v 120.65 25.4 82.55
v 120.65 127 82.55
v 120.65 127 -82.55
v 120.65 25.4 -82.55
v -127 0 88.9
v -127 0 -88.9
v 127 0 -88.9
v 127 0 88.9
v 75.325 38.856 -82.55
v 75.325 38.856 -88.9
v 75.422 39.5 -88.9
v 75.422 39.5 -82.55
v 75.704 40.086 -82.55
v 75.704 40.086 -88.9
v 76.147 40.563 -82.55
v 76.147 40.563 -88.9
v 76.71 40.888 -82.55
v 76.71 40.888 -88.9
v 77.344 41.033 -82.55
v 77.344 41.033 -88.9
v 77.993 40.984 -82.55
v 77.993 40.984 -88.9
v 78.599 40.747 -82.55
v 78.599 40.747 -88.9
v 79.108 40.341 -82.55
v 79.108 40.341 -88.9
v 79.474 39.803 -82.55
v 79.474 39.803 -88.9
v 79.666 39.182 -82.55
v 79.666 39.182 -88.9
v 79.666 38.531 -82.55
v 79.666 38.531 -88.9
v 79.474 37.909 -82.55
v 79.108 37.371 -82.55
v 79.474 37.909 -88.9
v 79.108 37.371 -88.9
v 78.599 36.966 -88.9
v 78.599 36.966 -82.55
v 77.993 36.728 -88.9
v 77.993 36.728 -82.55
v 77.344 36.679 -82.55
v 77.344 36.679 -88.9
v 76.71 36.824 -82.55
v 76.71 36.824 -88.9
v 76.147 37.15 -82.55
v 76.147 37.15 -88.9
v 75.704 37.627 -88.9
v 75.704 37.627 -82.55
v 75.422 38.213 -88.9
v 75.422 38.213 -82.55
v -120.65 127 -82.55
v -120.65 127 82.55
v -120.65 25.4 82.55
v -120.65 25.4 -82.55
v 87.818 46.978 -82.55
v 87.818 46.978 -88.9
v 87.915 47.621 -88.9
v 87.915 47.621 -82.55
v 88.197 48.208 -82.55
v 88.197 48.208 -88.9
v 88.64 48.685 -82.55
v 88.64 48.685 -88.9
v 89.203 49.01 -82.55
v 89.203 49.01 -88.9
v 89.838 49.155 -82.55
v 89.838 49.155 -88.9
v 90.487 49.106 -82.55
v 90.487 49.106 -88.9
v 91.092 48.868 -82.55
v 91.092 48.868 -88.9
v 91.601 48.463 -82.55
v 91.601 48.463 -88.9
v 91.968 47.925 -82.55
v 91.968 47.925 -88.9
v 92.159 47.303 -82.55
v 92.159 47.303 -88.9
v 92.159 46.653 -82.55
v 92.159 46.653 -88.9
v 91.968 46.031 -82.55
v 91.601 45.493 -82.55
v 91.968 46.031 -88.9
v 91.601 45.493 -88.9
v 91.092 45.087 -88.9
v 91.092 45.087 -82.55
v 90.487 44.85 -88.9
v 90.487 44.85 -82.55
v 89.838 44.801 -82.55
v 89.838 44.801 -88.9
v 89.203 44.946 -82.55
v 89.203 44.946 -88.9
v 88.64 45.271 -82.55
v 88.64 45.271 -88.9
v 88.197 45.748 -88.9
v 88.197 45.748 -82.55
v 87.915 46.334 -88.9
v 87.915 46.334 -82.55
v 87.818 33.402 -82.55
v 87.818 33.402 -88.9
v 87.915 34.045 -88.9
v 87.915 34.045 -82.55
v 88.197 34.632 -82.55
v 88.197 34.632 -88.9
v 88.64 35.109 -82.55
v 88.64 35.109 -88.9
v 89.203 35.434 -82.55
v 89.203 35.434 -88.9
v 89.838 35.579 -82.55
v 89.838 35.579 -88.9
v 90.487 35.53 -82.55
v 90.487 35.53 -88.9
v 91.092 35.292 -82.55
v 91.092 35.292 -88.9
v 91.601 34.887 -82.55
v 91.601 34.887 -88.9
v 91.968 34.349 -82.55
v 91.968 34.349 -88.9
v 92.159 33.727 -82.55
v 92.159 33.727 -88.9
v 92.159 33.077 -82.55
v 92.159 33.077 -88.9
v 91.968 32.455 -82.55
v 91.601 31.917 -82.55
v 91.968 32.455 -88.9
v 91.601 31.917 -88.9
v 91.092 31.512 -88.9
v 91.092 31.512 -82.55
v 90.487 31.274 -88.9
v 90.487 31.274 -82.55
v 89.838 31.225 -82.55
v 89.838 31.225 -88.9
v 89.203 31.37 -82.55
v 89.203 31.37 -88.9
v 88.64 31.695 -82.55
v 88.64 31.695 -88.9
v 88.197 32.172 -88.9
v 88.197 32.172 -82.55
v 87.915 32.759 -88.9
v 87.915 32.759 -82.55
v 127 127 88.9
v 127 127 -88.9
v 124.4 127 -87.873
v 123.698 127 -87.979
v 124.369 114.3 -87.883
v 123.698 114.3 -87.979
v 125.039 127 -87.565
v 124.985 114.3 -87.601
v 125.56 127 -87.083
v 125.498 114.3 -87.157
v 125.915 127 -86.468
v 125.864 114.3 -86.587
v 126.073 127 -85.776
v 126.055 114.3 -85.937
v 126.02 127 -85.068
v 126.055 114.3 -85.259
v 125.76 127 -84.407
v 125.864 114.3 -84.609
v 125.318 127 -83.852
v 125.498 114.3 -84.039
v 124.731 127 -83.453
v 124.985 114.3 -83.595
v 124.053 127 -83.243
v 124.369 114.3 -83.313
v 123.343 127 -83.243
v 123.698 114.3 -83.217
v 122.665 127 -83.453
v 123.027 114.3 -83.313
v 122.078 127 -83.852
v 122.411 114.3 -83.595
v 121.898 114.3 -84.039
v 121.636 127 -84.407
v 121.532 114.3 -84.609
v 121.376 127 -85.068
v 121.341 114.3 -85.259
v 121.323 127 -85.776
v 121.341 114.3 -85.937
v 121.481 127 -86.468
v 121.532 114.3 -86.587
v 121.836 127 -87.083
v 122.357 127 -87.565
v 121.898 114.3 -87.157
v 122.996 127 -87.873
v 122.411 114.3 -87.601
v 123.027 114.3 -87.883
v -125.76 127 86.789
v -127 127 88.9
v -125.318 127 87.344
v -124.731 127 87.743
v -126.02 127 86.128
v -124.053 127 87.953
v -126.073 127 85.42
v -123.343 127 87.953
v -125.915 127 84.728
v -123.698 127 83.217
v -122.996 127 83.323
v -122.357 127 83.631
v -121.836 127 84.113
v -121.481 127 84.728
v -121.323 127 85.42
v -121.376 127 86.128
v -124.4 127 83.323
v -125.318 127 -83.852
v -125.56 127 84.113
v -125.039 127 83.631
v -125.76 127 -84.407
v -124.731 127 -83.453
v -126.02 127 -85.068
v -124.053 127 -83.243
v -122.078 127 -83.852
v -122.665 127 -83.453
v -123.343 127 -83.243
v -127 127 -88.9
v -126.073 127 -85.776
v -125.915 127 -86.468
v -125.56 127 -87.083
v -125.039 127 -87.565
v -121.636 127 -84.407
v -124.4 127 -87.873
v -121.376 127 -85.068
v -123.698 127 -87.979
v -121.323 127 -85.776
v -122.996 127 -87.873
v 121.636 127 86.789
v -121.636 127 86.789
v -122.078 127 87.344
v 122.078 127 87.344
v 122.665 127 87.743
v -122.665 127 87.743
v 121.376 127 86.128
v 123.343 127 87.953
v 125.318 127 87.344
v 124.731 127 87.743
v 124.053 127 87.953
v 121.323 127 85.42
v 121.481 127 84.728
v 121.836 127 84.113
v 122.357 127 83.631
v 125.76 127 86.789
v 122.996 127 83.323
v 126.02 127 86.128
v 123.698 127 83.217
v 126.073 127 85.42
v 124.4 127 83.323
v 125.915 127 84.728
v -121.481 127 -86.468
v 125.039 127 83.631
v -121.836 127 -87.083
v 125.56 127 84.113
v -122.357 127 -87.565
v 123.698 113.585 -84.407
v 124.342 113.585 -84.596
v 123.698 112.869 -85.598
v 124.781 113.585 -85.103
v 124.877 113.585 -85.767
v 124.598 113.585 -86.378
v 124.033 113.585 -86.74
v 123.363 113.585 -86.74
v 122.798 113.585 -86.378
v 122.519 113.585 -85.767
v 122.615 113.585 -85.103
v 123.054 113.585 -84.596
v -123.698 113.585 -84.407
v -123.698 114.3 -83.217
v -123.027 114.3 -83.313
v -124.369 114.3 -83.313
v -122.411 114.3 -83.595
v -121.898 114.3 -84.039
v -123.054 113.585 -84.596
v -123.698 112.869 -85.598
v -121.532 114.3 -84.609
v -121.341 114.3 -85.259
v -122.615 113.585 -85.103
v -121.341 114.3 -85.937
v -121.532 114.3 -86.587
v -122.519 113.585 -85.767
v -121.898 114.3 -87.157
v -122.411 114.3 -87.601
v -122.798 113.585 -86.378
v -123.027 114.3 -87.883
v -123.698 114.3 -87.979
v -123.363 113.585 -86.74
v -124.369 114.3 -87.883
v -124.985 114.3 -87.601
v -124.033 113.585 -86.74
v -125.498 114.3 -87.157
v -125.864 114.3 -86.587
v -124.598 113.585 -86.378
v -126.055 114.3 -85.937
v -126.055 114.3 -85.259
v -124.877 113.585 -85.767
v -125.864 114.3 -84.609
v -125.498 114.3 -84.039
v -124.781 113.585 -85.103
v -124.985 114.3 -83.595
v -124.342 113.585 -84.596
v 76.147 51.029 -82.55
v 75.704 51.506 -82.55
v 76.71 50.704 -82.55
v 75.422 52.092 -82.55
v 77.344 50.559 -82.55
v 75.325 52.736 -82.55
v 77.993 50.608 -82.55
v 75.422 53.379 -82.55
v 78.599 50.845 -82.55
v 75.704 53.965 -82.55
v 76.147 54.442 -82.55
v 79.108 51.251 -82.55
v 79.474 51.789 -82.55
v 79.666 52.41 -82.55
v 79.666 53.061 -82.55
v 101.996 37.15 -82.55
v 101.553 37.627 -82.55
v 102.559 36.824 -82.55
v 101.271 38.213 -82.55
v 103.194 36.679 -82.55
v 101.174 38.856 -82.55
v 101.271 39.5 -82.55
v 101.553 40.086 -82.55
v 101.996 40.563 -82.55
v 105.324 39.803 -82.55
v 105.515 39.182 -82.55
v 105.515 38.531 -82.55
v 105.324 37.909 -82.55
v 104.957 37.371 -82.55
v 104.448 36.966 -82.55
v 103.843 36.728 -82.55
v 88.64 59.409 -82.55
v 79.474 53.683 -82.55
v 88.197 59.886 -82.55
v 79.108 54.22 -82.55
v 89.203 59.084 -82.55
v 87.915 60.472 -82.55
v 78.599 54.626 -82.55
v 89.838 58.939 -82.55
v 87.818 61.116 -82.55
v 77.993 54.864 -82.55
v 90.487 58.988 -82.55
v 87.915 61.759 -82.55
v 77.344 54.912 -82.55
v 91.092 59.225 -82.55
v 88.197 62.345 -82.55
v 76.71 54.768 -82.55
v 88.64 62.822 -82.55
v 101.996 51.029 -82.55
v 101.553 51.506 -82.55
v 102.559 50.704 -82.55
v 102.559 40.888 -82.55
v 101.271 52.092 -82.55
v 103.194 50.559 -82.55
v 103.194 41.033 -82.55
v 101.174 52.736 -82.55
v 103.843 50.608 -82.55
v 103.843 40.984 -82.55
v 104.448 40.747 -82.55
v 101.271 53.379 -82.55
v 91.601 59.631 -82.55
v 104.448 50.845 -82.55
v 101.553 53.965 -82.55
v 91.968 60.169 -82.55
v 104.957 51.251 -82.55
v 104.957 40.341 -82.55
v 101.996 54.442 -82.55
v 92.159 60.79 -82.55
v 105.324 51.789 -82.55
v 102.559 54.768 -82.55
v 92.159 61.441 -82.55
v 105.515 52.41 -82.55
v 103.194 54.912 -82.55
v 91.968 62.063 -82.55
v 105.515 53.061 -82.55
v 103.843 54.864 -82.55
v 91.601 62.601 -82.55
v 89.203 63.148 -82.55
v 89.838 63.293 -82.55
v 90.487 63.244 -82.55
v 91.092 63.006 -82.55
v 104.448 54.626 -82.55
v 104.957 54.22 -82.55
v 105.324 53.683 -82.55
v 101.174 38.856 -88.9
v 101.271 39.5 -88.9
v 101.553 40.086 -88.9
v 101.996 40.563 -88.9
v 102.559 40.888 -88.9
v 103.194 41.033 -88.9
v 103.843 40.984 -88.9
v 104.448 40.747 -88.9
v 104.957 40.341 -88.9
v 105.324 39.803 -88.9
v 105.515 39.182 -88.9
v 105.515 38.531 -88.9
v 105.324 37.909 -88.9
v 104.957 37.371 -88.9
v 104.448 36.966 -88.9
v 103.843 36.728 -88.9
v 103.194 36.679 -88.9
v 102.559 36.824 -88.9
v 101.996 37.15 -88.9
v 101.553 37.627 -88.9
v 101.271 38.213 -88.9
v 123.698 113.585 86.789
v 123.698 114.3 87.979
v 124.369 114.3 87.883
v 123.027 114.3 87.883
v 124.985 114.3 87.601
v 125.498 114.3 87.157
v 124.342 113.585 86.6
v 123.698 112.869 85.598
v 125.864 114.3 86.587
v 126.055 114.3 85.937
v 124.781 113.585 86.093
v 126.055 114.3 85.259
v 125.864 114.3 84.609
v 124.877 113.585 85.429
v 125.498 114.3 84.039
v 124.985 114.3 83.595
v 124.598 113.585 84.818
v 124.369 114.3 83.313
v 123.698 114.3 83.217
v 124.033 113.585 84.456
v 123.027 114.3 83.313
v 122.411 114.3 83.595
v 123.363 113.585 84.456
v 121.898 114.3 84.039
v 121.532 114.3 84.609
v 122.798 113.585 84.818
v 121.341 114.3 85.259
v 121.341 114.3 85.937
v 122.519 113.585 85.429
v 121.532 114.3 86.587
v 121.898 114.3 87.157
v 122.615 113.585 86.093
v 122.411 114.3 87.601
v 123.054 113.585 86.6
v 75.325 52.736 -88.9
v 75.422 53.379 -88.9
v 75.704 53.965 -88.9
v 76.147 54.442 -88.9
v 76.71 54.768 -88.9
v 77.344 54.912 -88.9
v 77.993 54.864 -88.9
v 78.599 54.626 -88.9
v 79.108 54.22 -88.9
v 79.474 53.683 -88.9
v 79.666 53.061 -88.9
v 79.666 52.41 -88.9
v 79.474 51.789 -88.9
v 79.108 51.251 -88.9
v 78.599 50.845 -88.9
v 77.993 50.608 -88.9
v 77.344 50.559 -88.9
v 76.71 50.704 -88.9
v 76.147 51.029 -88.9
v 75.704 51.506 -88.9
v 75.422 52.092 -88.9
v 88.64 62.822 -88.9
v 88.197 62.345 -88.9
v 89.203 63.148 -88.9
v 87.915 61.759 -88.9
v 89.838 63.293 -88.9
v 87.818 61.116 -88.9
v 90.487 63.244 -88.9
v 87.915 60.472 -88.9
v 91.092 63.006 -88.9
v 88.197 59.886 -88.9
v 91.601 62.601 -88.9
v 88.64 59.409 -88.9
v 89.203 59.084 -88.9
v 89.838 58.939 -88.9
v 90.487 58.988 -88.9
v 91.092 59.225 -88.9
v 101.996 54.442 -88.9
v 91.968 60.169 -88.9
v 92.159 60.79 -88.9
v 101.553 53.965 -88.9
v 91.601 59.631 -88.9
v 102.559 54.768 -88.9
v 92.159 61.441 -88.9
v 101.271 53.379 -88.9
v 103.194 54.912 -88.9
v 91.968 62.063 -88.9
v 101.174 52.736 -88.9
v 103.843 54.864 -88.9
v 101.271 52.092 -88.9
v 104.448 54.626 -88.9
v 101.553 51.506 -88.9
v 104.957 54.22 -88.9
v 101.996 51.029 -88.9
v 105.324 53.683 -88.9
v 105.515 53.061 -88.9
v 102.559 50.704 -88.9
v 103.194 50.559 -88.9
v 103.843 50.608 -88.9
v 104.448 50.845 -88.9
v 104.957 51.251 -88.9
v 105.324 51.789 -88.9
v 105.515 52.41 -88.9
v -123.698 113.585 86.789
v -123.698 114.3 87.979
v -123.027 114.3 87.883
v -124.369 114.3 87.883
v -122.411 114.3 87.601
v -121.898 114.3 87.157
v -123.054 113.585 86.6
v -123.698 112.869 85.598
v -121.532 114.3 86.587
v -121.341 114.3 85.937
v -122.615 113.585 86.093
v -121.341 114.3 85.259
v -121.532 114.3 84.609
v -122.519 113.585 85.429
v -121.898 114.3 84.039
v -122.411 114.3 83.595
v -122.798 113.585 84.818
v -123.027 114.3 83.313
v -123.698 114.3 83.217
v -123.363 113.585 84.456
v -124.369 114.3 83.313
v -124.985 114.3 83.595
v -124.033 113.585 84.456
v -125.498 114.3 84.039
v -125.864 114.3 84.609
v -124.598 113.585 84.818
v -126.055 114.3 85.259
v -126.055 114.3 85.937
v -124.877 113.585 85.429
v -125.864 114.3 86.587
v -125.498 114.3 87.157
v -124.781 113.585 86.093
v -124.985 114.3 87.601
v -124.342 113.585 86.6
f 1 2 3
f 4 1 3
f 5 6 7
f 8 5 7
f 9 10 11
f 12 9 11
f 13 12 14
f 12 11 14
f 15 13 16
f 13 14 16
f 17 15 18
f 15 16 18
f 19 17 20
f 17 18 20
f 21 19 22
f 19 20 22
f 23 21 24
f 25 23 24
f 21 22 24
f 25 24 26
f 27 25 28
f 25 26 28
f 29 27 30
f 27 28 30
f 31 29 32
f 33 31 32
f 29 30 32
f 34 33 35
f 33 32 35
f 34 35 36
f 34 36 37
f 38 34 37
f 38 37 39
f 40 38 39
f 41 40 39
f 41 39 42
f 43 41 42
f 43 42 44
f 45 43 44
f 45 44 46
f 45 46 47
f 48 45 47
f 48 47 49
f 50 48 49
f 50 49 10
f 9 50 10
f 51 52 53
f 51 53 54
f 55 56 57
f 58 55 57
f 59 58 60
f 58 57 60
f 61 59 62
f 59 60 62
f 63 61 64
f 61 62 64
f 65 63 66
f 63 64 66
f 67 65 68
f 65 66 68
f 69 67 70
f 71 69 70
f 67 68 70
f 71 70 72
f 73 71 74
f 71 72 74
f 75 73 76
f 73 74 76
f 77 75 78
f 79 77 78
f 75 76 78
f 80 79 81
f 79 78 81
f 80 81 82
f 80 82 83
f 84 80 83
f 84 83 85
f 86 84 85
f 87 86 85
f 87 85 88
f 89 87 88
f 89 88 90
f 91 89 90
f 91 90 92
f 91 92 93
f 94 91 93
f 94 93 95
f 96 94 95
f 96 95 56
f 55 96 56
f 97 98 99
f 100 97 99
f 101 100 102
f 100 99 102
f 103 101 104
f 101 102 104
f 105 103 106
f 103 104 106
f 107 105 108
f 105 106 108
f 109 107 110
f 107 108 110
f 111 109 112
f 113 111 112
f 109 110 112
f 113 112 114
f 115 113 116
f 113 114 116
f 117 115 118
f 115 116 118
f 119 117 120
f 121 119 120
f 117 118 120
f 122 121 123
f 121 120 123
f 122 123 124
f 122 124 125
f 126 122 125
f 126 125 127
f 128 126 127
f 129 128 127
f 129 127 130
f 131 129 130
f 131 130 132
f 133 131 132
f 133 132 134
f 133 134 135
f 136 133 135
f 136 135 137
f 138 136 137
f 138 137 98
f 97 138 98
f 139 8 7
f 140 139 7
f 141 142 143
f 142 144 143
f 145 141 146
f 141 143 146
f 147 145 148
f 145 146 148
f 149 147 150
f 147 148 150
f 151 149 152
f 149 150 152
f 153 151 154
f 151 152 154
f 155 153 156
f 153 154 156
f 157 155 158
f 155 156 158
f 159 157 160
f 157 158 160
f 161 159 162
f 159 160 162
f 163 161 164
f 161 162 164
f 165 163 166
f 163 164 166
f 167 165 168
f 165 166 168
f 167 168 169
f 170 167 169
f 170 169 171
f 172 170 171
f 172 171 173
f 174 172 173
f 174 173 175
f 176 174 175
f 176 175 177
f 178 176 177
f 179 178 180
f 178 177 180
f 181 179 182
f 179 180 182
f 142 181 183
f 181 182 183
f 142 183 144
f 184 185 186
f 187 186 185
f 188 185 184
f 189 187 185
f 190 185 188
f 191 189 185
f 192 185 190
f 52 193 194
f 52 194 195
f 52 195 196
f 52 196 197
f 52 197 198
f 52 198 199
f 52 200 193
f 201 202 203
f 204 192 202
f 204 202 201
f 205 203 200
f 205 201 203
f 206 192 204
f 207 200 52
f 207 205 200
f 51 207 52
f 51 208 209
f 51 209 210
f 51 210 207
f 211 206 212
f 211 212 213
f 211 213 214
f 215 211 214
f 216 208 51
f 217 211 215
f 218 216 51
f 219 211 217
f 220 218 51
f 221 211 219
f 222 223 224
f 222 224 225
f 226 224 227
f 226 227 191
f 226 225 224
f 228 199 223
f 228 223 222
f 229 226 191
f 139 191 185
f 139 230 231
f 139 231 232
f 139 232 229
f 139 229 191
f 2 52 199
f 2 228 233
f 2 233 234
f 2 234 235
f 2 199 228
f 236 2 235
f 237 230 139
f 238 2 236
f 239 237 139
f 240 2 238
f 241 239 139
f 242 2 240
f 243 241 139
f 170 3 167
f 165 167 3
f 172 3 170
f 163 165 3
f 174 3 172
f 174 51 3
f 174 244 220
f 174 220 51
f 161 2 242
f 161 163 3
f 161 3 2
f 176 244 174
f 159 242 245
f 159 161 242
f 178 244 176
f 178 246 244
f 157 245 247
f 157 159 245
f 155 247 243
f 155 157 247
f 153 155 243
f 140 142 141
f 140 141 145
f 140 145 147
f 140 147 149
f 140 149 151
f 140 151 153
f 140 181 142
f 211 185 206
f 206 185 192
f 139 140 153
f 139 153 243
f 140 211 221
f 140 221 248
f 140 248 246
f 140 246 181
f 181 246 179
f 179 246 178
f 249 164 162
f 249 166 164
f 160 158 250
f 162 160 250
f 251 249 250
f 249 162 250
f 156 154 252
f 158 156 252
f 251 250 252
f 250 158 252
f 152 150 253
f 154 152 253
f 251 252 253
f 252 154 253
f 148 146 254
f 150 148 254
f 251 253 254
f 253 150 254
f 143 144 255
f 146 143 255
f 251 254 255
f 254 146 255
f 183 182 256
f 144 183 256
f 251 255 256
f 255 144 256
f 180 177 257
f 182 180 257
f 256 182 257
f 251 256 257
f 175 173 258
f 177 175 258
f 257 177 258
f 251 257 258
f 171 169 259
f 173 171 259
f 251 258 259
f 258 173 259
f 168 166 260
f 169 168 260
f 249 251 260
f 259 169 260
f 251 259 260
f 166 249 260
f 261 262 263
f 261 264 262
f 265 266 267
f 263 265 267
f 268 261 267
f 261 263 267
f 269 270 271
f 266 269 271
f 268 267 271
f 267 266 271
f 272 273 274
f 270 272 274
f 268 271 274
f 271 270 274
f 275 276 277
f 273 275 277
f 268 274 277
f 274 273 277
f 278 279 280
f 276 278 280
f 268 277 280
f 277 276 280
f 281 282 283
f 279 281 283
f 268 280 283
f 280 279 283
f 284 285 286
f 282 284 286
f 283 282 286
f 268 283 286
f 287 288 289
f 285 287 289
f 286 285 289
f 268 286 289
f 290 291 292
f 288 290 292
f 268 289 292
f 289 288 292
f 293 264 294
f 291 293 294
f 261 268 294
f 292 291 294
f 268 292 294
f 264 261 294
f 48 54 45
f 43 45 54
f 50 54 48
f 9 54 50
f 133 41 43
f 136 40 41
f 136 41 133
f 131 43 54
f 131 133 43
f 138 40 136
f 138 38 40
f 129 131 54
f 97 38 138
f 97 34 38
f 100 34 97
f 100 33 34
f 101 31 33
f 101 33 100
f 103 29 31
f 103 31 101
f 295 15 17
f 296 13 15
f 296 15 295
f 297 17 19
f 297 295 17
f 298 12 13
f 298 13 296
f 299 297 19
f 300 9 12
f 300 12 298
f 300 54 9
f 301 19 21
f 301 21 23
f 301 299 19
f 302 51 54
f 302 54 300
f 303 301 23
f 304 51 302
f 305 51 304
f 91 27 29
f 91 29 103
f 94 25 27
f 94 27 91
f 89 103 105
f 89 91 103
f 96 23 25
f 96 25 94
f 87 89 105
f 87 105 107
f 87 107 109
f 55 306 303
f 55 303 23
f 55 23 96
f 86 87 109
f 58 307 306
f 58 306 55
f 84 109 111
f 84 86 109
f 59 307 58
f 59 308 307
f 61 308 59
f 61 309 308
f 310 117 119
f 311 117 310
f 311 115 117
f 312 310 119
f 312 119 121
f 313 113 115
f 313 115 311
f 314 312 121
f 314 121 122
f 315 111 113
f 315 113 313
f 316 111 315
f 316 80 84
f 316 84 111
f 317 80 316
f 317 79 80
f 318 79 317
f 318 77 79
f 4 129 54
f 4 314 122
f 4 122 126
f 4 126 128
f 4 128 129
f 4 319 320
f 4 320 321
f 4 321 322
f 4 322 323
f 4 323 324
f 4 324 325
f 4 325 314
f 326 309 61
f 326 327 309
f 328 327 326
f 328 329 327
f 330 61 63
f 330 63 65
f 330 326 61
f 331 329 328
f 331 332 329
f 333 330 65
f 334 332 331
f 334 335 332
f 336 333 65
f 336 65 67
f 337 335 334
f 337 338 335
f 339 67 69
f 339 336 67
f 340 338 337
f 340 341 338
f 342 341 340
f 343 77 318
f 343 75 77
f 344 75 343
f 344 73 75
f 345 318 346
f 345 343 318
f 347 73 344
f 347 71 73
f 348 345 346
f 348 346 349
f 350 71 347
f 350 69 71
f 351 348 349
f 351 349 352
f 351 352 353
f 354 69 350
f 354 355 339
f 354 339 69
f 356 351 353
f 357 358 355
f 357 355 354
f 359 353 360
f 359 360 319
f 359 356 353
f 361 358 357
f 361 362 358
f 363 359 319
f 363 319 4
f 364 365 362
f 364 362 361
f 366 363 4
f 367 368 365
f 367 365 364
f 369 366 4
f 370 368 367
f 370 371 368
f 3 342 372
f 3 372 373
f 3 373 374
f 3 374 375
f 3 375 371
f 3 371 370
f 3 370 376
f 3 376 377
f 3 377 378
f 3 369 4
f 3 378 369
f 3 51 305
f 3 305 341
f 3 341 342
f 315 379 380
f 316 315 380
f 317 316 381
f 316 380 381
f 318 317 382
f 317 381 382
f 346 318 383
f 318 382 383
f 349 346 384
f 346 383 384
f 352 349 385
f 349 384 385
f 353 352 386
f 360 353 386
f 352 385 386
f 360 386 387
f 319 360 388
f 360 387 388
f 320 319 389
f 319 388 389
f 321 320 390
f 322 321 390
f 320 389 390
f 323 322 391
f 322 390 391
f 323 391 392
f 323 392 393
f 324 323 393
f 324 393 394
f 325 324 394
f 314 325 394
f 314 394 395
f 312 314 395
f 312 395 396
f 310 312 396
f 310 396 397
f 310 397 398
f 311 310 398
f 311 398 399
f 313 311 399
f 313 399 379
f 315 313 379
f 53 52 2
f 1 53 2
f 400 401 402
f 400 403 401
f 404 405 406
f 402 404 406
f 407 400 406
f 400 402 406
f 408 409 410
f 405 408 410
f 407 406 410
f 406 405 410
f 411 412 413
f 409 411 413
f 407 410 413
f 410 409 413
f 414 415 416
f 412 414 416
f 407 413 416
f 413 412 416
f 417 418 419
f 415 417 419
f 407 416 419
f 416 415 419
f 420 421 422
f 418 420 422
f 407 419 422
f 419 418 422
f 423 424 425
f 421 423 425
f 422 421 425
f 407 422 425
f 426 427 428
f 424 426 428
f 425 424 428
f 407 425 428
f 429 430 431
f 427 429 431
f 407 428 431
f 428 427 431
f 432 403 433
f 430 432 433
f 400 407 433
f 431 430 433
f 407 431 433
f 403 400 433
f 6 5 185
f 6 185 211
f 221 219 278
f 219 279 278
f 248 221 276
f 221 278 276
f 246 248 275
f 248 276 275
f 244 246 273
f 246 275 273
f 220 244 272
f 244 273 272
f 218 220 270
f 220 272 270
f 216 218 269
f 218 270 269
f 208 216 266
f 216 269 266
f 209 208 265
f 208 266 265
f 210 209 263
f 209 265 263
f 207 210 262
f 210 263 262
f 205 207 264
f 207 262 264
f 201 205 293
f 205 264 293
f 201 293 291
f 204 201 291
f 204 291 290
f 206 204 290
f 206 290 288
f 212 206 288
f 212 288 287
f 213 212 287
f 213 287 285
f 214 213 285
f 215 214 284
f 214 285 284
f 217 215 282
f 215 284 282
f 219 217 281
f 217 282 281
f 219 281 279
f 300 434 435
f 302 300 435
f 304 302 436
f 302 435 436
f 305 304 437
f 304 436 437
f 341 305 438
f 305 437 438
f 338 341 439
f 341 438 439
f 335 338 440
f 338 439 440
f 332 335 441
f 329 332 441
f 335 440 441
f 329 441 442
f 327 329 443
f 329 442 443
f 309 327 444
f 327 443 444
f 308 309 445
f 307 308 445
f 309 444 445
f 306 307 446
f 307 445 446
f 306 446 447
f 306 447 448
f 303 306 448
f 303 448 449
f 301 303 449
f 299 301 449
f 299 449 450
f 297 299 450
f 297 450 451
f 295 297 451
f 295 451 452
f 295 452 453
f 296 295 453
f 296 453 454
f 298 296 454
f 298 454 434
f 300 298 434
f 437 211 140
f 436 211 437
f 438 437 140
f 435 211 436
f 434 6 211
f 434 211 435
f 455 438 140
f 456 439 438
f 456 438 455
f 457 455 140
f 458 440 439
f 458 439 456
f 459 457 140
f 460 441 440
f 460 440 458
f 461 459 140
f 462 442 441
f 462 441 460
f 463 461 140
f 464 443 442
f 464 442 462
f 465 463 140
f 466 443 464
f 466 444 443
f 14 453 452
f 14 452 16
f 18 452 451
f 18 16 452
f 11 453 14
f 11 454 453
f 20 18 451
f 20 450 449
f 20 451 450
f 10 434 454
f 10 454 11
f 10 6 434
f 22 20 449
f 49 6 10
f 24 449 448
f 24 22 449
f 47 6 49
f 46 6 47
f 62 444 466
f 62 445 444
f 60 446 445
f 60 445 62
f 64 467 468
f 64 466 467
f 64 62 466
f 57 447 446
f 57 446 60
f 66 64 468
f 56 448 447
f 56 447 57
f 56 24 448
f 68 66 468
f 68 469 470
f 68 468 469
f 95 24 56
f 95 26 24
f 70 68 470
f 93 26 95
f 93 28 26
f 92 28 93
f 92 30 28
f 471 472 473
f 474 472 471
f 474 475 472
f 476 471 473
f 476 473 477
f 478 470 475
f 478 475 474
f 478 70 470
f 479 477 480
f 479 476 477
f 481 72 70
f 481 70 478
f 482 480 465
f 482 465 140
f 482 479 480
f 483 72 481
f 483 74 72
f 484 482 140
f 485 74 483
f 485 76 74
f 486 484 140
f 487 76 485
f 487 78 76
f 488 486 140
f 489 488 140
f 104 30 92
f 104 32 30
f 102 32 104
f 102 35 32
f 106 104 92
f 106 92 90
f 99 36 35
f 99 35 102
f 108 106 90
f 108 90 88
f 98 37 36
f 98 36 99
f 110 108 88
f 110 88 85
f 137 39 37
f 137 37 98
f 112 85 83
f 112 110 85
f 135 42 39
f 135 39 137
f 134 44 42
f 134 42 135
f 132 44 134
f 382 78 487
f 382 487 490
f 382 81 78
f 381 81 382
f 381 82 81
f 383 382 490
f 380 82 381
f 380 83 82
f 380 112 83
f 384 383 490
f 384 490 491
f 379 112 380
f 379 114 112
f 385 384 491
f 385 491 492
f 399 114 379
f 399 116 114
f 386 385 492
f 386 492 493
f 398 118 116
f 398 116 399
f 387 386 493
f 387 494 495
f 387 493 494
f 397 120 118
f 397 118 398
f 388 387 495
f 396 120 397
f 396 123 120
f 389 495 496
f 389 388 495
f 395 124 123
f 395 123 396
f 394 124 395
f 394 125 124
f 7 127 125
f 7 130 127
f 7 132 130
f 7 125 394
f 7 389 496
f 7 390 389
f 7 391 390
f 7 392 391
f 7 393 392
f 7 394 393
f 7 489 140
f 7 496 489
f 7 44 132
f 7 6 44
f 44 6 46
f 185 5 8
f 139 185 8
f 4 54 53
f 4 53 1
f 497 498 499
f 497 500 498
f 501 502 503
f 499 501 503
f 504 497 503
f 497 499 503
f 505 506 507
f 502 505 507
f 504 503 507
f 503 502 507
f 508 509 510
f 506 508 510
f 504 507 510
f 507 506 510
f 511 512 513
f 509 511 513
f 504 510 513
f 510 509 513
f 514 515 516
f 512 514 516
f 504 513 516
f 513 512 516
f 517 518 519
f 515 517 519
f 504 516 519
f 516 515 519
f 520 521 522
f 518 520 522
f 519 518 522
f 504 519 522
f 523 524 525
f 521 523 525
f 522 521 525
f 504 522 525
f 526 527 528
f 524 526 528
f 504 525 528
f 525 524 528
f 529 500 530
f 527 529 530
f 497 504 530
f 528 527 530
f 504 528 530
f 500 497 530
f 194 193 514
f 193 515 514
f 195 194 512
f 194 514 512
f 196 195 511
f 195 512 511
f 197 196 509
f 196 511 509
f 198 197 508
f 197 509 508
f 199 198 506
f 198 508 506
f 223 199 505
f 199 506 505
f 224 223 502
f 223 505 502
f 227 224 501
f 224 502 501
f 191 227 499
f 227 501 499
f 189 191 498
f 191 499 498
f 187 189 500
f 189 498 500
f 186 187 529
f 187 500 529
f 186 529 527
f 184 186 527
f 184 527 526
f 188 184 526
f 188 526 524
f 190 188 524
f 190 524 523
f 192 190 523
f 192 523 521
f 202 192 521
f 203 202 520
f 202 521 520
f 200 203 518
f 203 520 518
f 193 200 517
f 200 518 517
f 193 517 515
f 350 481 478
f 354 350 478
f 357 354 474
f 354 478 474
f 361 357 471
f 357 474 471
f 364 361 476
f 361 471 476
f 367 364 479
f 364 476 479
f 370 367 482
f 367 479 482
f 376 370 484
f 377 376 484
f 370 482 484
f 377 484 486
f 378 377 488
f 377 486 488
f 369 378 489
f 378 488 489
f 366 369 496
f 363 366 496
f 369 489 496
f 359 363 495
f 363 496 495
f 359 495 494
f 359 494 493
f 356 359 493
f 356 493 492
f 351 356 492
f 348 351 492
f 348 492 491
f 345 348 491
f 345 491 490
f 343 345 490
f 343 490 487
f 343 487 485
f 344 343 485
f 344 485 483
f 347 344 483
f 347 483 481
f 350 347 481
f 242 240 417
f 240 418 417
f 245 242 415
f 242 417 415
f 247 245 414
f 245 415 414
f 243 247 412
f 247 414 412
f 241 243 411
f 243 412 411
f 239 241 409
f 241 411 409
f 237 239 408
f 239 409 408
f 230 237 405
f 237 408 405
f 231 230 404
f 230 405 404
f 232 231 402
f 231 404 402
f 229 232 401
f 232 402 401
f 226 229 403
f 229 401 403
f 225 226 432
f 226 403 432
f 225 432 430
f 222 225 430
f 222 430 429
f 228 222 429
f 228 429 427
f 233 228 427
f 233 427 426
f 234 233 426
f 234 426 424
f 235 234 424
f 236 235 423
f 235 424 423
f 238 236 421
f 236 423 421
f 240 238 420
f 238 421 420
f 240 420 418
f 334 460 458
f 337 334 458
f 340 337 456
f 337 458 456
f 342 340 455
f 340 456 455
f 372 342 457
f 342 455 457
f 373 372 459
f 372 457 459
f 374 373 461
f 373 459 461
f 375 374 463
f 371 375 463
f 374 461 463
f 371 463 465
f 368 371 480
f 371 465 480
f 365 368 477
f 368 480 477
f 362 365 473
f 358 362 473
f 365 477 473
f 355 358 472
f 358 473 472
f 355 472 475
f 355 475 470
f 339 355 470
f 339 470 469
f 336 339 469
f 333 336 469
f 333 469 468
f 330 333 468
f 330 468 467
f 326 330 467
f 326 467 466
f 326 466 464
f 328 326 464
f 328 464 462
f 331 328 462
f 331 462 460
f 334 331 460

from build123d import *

# Parameters (mm, degrees)
SKETCH1_W                            = 254
SKETCH1_H                            = 177.8
BOSS_EXTRUDE1_DEPTH                  = 127
SKETCH2_W                            = 241.3
SKETCH2_H                            = 165.1
CUT_EXTRUDE1_DEPTH                   = 101.6
F_3_16_0_1875_DIAMETER_HOLE3_D       = 4.7625
F_3_16_0_1875_DIAMETER_HOLE3_DEPTH   = 12.7
F_3_16_0_1875_DIAMETER_HOLE3_TIP     = 1.430799349
F_3_16_0_1875_DIAMETER_HOLE4_D       = 4.7625
F_3_16_0_1875_DIAMETER_HOLE4_DEPTH   = 12.7
F_3_16_0_1875_DIAMETER_HOLE4_TIP     = 1.430799349
F_3_16_0_1875_DIAMETER_HOLE5_D       = 4.7625
F_3_16_0_1875_DIAMETER_HOLE5_DEPTH   = 12.7
F_3_16_0_1875_DIAMETER_HOLE5_TIP     = 1.430799349
F_3_16_0_1875_DIAMETER_HOLE6_D       = 4.7625
F_3_16_0_1875_DIAMETER_HOLE6_DEPTH   = 12.7
F_3_16_0_1875_DIAMETER_HOLE6_TIP     = 1.430799349
F_11_64_0_17188_DIAMETER_HOLE1_D     = 4.365752
F_11_64_0_17188_DIAMETER_HOLE1_DEPTH = 6.35


with BuildPart() as part:
    # Sketch1 → Boss-Extrude1 (new body)
    with BuildSketch(Plane(origin=(0, 0, 0), x_dir=(1, 0, 0), z_dir=(0, 1, 0))):
        Rectangle(SKETCH1_W, SKETCH1_H)
    extrude(amount=BOSS_EXTRUDE1_DEPTH)

    # Sketch2 → Cut-Extrude1 (cut)
    with BuildSketch(Plane(origin=(0, 127, 0), x_dir=(1, 0, 0), z_dir=(0, 1, 0))):
        Rectangle(SKETCH2_W, SKETCH2_H)
    extrude(amount=-CUT_EXTRUDE1_DEPTH, mode=Mode.SUBTRACT)

    # 3/16 (0.1875) Diameter Hole3
    with Locations(Plane(origin=(-123.698, 127, -85.598), x_dir=(0, 0, 1), z_dir=(0, 1, 0))):
        with Locations((0, 0)):
            Hole(F_3_16_0_1875_DIAMETER_HOLE3_D / 2, depth=F_3_16_0_1875_DIAMETER_HOLE3_DEPTH)
            with Locations((0, 0, -(F_3_16_0_1875_DIAMETER_HOLE3_DEPTH + F_3_16_0_1875_DIAMETER_HOLE3_TIP / 2))):  # 118° drill point
                Cone(0, F_3_16_0_1875_DIAMETER_HOLE3_D / 2, F_3_16_0_1875_DIAMETER_HOLE3_TIP, mode=Mode.SUBTRACT)

    # 3/16 (0.1875) Diameter Hole4
    with Locations(Plane(origin=(123.698, 127, -85.598), x_dir=(0, 0, 1), z_dir=(0, 1, 0))):
        with Locations((0, 0)):
            Hole(F_3_16_0_1875_DIAMETER_HOLE4_D / 2, depth=F_3_16_0_1875_DIAMETER_HOLE4_DEPTH)
            with Locations((0, 0, -(F_3_16_0_1875_DIAMETER_HOLE4_DEPTH + F_3_16_0_1875_DIAMETER_HOLE4_TIP / 2))):  # 118° drill point
                Cone(0, F_3_16_0_1875_DIAMETER_HOLE4_D / 2, F_3_16_0_1875_DIAMETER_HOLE4_TIP, mode=Mode.SUBTRACT)

    # 3/16 (0.1875) Diameter Hole5
    with Locations(Plane(origin=(-123.698, 127, 85.598), x_dir=(0, 0, 1), z_dir=(0, 1, 0))):
        with Locations((0, 0)):
            Hole(F_3_16_0_1875_DIAMETER_HOLE5_D / 2, depth=F_3_16_0_1875_DIAMETER_HOLE5_DEPTH)
            with Locations((0, 0, -(F_3_16_0_1875_DIAMETER_HOLE5_DEPTH + F_3_16_0_1875_DIAMETER_HOLE5_TIP / 2))):  # 118° drill point
                Cone(0, F_3_16_0_1875_DIAMETER_HOLE5_D / 2, F_3_16_0_1875_DIAMETER_HOLE5_TIP, mode=Mode.SUBTRACT)

    # 3/16 (0.1875) Diameter Hole6
    with Locations(Plane(origin=(123.698, 127, 85.598), x_dir=(0, 0, 1), z_dir=(0, 1, 0))):
        with Locations((0, 0)):
            Hole(F_3_16_0_1875_DIAMETER_HOLE6_D / 2, depth=F_3_16_0_1875_DIAMETER_HOLE6_DEPTH)
            with Locations((0, 0, -(F_3_16_0_1875_DIAMETER_HOLE6_DEPTH + F_3_16_0_1875_DIAMETER_HOLE6_TIP / 2))):  # 118° drill point
                Cone(0, F_3_16_0_1875_DIAMETER_HOLE6_D / 2, F_3_16_0_1875_DIAMETER_HOLE6_TIP, mode=Mode.SUBTRACT)

    # 11/64 (0.17188) Diameter Hole1
    with Locations(Plane.XY.offset(-82.55)):
        with Locations((90.000861875, 33.401943058), (90.000861875, 61.115793816), (77.507570052, 52.735678174), (77.507570052, 38.856201142), (103.356898088, 52.735678174), (103.356898088, 38.856201142), (90.000861875, 46.977884259)):
            Hole(F_11_64_0_17188_DIAMETER_HOLE1_D / 2, depth=F_11_64_0_17188_DIAMETER_HOLE1_DEPTH)


solid = part.part
